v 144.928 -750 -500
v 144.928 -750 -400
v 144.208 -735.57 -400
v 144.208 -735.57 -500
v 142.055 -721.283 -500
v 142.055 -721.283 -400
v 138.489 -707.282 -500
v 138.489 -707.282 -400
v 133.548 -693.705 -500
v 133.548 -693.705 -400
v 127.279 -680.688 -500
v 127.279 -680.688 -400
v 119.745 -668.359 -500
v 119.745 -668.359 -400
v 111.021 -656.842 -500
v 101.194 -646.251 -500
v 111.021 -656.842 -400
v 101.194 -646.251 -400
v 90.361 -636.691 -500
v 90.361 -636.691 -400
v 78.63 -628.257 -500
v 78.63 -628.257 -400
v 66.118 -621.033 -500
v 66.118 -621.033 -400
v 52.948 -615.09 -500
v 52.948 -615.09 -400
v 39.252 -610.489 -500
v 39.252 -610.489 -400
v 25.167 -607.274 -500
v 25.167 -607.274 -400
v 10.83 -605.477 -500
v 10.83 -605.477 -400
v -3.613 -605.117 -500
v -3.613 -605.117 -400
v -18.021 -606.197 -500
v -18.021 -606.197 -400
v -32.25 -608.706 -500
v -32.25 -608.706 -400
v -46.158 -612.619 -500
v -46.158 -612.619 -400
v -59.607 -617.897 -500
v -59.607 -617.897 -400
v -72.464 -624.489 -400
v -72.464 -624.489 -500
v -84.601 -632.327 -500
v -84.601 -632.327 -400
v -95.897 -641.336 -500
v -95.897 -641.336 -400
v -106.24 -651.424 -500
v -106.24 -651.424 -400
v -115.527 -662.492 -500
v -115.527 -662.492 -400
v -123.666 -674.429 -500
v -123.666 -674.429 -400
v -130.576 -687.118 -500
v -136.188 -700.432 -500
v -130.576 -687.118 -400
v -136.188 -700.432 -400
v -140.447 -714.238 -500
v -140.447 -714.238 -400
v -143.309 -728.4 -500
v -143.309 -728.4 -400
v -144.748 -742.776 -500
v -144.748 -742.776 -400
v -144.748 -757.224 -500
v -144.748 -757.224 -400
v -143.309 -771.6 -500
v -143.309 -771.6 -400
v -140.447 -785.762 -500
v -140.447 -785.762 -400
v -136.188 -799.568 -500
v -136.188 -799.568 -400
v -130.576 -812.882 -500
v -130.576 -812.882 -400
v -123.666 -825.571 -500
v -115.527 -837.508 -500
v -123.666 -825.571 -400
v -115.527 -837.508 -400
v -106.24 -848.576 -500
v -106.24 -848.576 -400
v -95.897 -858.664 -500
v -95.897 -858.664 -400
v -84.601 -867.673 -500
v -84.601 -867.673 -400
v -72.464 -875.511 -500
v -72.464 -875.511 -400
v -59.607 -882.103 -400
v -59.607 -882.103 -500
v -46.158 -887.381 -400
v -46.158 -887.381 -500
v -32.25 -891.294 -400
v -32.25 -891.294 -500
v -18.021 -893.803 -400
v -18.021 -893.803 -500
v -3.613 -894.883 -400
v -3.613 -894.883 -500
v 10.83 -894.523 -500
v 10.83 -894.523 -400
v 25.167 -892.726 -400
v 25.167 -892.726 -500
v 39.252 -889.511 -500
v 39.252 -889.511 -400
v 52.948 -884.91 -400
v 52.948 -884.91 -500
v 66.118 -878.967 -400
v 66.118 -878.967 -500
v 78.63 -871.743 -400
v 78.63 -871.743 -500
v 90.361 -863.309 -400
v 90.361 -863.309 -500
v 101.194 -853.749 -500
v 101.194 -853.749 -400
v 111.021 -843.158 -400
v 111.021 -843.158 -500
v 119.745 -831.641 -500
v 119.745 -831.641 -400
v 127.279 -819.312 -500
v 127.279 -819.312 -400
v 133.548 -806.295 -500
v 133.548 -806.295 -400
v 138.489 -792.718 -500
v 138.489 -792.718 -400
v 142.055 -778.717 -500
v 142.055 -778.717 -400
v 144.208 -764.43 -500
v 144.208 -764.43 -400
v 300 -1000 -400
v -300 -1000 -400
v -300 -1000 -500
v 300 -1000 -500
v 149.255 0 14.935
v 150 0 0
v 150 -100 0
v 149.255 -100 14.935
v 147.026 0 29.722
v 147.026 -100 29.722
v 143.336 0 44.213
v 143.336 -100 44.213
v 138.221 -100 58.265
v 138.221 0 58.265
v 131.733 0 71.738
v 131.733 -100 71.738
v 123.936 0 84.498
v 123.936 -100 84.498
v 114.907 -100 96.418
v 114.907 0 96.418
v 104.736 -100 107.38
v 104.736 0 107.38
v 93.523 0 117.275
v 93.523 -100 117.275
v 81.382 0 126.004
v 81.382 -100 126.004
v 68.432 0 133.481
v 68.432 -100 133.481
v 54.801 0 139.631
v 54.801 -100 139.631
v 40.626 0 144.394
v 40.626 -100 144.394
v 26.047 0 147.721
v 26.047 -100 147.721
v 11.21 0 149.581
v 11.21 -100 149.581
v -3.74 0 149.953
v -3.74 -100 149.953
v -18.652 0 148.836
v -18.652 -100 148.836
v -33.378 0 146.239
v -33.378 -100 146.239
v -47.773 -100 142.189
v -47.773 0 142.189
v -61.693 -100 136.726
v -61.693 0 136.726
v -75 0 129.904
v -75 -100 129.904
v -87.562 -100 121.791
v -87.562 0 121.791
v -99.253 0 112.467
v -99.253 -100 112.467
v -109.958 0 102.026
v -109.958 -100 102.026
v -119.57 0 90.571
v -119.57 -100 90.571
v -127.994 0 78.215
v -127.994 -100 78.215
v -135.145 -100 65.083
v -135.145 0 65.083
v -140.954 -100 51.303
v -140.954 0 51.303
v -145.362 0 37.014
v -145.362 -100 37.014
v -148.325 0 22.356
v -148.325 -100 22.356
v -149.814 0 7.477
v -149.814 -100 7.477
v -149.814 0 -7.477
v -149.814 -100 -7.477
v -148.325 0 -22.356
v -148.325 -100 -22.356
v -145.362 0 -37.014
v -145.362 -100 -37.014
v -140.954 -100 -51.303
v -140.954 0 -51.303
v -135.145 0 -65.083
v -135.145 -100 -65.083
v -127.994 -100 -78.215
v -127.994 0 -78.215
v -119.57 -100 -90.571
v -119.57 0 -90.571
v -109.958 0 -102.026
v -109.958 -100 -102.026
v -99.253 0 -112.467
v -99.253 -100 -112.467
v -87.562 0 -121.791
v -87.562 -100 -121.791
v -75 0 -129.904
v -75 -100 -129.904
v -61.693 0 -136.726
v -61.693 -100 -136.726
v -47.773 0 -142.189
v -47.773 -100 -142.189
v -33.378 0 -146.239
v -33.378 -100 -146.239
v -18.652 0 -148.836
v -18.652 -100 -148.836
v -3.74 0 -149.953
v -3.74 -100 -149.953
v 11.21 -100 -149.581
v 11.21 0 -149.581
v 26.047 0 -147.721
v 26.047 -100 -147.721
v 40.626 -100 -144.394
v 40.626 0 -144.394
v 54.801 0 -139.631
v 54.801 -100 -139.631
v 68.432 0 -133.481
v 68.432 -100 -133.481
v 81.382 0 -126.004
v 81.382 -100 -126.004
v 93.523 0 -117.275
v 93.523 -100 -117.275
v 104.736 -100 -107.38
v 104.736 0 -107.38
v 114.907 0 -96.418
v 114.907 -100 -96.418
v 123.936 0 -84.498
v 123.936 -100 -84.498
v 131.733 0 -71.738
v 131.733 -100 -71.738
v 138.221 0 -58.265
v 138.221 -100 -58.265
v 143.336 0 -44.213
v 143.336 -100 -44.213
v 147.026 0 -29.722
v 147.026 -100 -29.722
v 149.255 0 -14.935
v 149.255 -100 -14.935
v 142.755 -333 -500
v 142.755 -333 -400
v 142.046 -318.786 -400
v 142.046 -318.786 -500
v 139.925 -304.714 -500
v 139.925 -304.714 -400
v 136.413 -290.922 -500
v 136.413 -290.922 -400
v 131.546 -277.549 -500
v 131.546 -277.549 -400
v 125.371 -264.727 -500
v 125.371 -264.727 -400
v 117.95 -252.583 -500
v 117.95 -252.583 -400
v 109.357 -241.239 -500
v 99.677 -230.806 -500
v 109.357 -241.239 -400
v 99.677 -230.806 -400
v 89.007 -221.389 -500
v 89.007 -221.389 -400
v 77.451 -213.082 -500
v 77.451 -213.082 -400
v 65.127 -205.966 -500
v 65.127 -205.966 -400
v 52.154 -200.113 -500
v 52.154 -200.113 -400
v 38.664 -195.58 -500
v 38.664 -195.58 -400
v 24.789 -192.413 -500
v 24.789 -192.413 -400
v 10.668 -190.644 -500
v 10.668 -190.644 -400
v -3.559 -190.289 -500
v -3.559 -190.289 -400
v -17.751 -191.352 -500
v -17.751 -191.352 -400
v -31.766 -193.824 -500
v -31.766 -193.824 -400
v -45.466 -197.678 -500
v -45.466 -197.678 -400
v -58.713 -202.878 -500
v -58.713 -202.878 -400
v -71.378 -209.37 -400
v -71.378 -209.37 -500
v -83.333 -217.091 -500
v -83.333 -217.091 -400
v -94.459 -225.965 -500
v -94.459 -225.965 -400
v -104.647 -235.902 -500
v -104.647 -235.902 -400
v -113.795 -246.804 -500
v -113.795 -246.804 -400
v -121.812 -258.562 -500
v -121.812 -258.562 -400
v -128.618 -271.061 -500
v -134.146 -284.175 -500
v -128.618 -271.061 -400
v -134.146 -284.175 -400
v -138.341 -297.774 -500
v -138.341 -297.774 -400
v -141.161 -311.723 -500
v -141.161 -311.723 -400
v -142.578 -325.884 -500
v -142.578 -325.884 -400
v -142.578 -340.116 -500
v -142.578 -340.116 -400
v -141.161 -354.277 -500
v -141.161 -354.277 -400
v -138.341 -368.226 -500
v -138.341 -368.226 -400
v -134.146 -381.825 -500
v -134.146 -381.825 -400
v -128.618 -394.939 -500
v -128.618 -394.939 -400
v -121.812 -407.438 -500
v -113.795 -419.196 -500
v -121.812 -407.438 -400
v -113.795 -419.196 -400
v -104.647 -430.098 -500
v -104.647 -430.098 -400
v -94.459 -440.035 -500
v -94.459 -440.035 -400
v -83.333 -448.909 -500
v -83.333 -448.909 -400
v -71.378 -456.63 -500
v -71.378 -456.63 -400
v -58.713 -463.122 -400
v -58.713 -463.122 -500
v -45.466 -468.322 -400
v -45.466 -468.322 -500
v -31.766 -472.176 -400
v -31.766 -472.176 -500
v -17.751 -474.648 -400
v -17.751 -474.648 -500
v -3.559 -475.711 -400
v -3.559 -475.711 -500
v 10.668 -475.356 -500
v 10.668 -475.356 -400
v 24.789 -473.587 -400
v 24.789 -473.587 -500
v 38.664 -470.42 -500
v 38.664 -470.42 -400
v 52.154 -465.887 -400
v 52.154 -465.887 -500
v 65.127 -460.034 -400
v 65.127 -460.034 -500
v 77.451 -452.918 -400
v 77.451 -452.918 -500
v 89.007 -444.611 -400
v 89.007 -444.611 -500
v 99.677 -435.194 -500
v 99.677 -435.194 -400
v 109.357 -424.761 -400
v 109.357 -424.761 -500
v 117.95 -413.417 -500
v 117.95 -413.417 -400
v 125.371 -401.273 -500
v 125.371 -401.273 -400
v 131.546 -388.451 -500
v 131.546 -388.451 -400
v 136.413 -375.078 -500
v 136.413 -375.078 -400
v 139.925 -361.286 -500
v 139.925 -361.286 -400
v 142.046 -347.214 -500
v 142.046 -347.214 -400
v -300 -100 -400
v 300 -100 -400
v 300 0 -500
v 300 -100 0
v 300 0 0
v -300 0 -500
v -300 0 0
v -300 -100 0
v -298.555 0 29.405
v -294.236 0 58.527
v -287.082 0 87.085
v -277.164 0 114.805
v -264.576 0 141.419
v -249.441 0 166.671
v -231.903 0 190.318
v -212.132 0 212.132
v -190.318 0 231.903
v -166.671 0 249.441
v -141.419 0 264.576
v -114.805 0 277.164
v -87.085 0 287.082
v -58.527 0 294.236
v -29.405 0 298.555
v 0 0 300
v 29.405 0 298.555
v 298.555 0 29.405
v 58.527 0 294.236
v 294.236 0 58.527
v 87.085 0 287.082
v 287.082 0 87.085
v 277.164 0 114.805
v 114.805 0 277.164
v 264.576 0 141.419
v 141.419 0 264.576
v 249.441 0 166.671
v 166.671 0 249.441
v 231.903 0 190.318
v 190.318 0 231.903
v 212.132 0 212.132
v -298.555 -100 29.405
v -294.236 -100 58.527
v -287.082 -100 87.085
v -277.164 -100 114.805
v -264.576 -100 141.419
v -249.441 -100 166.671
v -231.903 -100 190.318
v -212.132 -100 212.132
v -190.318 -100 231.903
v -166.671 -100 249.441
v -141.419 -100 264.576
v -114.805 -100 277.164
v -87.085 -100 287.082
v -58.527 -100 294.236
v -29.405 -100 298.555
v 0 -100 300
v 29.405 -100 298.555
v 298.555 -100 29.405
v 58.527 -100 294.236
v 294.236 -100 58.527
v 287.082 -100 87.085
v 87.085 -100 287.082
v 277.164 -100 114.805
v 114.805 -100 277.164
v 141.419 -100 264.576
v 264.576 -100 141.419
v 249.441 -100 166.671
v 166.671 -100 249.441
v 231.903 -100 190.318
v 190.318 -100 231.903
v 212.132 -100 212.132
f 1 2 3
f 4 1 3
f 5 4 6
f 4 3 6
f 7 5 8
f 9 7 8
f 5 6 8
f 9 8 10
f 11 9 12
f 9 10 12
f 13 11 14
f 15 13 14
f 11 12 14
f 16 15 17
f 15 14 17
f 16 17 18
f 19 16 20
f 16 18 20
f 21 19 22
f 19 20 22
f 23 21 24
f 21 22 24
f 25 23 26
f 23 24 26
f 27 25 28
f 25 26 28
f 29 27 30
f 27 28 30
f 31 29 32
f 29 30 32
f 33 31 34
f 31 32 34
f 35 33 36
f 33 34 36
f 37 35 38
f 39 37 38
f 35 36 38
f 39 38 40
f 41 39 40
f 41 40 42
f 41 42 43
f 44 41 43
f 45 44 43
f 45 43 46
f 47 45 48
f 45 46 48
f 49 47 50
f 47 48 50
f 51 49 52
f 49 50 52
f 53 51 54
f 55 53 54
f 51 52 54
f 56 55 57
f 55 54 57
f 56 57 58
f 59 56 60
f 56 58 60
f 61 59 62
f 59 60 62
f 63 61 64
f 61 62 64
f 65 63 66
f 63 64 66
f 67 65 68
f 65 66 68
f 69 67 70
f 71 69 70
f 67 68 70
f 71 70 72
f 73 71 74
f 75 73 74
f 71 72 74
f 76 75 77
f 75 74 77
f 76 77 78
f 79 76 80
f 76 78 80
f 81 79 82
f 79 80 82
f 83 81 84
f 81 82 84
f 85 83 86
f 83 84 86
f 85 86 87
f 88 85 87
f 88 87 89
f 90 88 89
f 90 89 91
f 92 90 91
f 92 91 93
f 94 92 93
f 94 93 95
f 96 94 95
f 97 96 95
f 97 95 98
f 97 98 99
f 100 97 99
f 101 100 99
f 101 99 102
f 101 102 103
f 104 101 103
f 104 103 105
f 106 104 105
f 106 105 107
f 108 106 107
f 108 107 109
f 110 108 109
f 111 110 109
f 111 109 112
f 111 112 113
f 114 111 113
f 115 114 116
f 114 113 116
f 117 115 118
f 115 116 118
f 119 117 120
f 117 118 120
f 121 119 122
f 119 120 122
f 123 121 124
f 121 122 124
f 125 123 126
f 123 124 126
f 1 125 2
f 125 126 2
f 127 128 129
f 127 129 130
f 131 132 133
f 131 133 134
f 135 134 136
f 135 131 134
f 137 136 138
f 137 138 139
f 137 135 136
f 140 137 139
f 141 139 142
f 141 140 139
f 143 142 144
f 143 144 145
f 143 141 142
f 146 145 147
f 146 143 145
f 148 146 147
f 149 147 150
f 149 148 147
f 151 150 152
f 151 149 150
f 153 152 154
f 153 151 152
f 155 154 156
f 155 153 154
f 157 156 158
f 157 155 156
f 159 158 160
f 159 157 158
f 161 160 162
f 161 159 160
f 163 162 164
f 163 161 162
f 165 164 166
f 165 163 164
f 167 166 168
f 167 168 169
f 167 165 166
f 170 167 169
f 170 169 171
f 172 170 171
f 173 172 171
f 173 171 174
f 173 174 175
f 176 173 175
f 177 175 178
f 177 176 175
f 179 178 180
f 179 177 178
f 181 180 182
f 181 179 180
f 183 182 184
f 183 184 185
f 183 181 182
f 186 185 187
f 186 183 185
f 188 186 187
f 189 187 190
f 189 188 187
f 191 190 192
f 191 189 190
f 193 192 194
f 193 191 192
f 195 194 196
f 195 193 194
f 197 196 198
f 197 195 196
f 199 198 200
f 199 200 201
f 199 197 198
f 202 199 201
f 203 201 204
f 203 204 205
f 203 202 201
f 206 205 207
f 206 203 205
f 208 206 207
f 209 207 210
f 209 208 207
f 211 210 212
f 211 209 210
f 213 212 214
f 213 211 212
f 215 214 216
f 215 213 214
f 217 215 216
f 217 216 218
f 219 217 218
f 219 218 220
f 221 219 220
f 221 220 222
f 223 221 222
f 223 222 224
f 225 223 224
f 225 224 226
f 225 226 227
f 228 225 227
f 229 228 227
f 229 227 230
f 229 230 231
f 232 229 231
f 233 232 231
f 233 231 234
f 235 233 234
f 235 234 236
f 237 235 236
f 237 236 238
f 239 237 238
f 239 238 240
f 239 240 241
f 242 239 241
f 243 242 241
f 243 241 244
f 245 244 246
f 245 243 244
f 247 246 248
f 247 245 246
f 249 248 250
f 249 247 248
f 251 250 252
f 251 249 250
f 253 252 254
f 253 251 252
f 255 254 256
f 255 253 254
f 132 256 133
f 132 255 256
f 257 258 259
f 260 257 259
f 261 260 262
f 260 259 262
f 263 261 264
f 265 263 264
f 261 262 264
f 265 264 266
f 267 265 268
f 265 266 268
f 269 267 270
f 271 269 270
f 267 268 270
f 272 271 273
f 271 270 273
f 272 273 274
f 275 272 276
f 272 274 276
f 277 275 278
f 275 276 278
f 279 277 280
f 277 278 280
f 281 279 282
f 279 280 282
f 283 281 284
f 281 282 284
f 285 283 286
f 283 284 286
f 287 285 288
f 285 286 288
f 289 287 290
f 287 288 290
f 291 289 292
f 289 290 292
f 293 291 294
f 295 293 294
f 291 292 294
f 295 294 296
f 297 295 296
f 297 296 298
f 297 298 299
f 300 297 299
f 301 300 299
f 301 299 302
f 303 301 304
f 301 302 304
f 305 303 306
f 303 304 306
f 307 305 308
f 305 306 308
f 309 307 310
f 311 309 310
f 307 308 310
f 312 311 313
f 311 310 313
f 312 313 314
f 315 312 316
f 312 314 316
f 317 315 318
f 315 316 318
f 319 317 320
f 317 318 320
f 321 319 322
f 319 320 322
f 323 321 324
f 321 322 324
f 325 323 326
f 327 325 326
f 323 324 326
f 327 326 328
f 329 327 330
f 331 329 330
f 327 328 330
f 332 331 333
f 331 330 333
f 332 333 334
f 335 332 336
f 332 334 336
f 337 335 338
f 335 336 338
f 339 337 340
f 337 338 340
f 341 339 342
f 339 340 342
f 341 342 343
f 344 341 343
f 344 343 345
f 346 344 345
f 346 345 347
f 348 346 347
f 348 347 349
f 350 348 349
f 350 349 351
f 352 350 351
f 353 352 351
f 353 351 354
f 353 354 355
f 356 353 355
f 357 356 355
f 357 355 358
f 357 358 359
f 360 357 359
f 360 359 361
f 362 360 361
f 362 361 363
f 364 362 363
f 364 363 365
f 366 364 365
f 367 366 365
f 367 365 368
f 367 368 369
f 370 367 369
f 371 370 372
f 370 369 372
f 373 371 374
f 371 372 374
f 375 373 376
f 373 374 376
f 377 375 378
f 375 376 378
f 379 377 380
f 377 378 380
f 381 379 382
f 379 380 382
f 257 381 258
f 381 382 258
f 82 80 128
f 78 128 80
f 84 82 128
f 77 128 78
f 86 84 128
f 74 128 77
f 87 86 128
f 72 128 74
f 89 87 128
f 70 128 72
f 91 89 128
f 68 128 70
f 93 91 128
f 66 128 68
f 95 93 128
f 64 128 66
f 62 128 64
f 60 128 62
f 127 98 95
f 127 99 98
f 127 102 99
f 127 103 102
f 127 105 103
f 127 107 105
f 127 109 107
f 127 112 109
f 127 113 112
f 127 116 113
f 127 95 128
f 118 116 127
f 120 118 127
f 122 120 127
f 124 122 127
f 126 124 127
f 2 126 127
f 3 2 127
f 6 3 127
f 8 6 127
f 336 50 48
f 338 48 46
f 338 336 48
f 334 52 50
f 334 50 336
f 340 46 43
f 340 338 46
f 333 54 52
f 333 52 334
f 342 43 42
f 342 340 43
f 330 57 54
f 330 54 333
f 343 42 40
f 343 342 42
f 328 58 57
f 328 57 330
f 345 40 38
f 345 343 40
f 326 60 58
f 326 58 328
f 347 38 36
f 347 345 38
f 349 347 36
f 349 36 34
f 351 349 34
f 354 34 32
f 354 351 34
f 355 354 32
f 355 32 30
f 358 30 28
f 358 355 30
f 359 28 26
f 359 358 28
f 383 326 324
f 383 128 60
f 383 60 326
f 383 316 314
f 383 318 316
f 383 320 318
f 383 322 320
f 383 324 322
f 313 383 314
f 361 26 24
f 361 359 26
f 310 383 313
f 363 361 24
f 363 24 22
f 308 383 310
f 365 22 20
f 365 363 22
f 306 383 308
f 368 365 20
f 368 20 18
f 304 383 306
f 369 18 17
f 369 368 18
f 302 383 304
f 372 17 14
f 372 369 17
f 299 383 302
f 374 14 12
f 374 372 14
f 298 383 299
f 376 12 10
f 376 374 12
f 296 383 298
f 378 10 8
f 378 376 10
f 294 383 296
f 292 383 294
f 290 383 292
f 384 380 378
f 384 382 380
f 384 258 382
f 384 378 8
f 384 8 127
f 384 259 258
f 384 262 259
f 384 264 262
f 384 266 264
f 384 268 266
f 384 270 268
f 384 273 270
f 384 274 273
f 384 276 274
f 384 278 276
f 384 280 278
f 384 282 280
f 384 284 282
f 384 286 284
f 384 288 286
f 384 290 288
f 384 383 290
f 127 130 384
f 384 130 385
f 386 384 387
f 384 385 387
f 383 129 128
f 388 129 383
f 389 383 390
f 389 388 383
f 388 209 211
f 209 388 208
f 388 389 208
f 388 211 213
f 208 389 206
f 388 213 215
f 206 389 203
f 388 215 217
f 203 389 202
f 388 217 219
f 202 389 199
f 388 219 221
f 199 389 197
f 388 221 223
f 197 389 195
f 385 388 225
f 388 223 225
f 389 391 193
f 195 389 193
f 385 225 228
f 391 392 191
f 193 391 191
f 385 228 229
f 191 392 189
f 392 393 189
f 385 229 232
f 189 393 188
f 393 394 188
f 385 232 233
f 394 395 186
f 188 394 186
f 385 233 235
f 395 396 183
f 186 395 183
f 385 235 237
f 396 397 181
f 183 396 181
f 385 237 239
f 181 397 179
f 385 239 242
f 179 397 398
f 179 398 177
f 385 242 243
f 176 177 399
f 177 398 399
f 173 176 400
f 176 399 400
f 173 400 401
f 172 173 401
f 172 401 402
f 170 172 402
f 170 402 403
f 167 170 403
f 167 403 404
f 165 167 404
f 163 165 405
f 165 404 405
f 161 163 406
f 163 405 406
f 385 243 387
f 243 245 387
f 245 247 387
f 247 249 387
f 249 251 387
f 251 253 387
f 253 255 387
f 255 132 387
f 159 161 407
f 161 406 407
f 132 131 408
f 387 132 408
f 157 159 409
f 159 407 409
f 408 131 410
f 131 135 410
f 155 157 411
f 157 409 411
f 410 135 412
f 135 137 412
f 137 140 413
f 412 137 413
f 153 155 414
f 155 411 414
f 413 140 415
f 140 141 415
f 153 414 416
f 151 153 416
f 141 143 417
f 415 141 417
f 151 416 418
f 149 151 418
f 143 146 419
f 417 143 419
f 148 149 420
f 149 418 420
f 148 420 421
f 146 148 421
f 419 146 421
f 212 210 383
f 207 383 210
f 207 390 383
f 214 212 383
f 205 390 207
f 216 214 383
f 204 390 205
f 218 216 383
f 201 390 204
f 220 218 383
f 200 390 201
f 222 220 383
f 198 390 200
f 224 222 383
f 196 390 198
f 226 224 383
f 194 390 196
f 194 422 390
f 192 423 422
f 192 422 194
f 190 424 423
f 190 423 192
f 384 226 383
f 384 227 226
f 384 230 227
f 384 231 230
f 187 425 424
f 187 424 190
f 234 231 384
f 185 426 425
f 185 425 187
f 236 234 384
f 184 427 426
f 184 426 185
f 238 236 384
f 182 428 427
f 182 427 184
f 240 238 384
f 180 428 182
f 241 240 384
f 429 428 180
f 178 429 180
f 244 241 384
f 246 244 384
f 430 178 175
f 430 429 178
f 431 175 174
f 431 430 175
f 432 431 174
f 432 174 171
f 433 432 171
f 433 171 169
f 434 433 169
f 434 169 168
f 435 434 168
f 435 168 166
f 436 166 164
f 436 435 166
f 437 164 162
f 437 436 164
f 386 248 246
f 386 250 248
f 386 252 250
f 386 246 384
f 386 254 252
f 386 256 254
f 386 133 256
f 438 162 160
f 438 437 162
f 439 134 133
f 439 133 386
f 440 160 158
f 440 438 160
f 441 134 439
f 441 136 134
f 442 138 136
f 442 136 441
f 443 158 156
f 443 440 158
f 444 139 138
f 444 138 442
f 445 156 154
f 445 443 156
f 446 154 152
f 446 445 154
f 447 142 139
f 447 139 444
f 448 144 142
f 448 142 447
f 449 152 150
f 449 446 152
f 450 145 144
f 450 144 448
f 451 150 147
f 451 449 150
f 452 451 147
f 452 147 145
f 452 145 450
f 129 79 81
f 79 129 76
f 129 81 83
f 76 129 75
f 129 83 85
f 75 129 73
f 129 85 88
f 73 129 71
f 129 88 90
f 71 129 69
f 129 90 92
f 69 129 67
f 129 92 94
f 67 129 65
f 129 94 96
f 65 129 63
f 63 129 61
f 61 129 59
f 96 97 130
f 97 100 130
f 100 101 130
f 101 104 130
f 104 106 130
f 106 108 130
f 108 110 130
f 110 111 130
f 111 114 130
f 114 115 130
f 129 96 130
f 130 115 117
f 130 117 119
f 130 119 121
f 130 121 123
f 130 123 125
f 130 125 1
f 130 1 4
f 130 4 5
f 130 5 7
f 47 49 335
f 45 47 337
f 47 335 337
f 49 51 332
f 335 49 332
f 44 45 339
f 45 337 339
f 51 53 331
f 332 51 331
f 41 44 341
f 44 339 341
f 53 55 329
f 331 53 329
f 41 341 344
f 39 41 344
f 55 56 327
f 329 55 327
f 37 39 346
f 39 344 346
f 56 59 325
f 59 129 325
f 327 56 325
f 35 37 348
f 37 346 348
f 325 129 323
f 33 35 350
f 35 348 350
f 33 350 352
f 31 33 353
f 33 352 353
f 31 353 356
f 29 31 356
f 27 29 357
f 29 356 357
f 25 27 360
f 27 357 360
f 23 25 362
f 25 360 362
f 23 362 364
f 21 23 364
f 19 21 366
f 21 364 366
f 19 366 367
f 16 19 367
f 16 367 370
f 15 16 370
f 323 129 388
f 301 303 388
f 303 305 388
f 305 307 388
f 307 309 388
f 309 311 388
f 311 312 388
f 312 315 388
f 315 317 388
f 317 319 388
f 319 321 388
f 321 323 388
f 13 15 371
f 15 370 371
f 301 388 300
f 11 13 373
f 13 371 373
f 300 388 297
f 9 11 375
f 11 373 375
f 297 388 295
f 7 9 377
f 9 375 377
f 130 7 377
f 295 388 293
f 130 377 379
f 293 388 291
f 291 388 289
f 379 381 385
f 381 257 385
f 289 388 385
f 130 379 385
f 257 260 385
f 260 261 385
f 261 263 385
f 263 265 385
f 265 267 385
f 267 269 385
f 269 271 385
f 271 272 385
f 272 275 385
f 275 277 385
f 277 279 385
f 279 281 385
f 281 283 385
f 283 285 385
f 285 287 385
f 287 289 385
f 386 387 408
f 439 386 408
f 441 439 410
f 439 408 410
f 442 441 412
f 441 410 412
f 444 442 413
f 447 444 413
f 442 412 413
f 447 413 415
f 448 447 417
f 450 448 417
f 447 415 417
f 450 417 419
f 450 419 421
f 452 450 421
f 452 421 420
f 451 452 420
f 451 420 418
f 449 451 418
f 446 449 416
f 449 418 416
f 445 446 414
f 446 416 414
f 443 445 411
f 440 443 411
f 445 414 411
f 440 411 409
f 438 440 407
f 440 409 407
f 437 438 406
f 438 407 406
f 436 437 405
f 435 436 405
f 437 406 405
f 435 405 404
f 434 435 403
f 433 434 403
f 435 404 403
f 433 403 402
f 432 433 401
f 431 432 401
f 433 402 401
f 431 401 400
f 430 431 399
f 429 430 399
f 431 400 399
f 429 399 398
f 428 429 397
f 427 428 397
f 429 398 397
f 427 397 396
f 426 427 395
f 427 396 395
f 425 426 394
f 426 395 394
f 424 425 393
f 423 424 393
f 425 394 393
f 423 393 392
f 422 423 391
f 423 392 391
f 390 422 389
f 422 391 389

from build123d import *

# Parameters (mm, degrees)
F0_R     = 150
F1_DEPTH = 100
F0_W     = 600
F0_H     = 100
F2_DEPTH = 1000
F3_R     = 142.755464
F3_R_2   = 144.928128
F4_DEPTH = 100


with BuildPart() as f1:
    # F0 (on Front) → F1 (new body)
    with BuildSketch(Plane.XZ):
        with BuildLine():
            Line((300, -400), (300, 0))
            ThreePointArc((300, 0), (0, 300), (-300, 0))
            Line((-300, 0), (-300, -400))
            Line((-300, -400), (300, -400))
        make_face()
        Circle(F0_R, mode=Mode.SUBTRACT)
    extrude(amount=F1_DEPTH)

    # F0 (on Front) → F2 (join)
    with BuildSketch(Plane.XZ):
        with Locations((0, -450)):
            Rectangle(F0_W, F0_H)
    extrude(amount=F2_DEPTH)

    # F3 (on face) → F4 (cut)
    with BuildSketch(Plane.XY.offset(-400)):
        with Locations((0, -333)):
            Circle(F3_R)
        with Locations((0, -750)):
            Circle(F3_R_2)
    extrude(amount=-F4_DEPTH, mode=Mode.SUBTRACT)


solid = f1.part
